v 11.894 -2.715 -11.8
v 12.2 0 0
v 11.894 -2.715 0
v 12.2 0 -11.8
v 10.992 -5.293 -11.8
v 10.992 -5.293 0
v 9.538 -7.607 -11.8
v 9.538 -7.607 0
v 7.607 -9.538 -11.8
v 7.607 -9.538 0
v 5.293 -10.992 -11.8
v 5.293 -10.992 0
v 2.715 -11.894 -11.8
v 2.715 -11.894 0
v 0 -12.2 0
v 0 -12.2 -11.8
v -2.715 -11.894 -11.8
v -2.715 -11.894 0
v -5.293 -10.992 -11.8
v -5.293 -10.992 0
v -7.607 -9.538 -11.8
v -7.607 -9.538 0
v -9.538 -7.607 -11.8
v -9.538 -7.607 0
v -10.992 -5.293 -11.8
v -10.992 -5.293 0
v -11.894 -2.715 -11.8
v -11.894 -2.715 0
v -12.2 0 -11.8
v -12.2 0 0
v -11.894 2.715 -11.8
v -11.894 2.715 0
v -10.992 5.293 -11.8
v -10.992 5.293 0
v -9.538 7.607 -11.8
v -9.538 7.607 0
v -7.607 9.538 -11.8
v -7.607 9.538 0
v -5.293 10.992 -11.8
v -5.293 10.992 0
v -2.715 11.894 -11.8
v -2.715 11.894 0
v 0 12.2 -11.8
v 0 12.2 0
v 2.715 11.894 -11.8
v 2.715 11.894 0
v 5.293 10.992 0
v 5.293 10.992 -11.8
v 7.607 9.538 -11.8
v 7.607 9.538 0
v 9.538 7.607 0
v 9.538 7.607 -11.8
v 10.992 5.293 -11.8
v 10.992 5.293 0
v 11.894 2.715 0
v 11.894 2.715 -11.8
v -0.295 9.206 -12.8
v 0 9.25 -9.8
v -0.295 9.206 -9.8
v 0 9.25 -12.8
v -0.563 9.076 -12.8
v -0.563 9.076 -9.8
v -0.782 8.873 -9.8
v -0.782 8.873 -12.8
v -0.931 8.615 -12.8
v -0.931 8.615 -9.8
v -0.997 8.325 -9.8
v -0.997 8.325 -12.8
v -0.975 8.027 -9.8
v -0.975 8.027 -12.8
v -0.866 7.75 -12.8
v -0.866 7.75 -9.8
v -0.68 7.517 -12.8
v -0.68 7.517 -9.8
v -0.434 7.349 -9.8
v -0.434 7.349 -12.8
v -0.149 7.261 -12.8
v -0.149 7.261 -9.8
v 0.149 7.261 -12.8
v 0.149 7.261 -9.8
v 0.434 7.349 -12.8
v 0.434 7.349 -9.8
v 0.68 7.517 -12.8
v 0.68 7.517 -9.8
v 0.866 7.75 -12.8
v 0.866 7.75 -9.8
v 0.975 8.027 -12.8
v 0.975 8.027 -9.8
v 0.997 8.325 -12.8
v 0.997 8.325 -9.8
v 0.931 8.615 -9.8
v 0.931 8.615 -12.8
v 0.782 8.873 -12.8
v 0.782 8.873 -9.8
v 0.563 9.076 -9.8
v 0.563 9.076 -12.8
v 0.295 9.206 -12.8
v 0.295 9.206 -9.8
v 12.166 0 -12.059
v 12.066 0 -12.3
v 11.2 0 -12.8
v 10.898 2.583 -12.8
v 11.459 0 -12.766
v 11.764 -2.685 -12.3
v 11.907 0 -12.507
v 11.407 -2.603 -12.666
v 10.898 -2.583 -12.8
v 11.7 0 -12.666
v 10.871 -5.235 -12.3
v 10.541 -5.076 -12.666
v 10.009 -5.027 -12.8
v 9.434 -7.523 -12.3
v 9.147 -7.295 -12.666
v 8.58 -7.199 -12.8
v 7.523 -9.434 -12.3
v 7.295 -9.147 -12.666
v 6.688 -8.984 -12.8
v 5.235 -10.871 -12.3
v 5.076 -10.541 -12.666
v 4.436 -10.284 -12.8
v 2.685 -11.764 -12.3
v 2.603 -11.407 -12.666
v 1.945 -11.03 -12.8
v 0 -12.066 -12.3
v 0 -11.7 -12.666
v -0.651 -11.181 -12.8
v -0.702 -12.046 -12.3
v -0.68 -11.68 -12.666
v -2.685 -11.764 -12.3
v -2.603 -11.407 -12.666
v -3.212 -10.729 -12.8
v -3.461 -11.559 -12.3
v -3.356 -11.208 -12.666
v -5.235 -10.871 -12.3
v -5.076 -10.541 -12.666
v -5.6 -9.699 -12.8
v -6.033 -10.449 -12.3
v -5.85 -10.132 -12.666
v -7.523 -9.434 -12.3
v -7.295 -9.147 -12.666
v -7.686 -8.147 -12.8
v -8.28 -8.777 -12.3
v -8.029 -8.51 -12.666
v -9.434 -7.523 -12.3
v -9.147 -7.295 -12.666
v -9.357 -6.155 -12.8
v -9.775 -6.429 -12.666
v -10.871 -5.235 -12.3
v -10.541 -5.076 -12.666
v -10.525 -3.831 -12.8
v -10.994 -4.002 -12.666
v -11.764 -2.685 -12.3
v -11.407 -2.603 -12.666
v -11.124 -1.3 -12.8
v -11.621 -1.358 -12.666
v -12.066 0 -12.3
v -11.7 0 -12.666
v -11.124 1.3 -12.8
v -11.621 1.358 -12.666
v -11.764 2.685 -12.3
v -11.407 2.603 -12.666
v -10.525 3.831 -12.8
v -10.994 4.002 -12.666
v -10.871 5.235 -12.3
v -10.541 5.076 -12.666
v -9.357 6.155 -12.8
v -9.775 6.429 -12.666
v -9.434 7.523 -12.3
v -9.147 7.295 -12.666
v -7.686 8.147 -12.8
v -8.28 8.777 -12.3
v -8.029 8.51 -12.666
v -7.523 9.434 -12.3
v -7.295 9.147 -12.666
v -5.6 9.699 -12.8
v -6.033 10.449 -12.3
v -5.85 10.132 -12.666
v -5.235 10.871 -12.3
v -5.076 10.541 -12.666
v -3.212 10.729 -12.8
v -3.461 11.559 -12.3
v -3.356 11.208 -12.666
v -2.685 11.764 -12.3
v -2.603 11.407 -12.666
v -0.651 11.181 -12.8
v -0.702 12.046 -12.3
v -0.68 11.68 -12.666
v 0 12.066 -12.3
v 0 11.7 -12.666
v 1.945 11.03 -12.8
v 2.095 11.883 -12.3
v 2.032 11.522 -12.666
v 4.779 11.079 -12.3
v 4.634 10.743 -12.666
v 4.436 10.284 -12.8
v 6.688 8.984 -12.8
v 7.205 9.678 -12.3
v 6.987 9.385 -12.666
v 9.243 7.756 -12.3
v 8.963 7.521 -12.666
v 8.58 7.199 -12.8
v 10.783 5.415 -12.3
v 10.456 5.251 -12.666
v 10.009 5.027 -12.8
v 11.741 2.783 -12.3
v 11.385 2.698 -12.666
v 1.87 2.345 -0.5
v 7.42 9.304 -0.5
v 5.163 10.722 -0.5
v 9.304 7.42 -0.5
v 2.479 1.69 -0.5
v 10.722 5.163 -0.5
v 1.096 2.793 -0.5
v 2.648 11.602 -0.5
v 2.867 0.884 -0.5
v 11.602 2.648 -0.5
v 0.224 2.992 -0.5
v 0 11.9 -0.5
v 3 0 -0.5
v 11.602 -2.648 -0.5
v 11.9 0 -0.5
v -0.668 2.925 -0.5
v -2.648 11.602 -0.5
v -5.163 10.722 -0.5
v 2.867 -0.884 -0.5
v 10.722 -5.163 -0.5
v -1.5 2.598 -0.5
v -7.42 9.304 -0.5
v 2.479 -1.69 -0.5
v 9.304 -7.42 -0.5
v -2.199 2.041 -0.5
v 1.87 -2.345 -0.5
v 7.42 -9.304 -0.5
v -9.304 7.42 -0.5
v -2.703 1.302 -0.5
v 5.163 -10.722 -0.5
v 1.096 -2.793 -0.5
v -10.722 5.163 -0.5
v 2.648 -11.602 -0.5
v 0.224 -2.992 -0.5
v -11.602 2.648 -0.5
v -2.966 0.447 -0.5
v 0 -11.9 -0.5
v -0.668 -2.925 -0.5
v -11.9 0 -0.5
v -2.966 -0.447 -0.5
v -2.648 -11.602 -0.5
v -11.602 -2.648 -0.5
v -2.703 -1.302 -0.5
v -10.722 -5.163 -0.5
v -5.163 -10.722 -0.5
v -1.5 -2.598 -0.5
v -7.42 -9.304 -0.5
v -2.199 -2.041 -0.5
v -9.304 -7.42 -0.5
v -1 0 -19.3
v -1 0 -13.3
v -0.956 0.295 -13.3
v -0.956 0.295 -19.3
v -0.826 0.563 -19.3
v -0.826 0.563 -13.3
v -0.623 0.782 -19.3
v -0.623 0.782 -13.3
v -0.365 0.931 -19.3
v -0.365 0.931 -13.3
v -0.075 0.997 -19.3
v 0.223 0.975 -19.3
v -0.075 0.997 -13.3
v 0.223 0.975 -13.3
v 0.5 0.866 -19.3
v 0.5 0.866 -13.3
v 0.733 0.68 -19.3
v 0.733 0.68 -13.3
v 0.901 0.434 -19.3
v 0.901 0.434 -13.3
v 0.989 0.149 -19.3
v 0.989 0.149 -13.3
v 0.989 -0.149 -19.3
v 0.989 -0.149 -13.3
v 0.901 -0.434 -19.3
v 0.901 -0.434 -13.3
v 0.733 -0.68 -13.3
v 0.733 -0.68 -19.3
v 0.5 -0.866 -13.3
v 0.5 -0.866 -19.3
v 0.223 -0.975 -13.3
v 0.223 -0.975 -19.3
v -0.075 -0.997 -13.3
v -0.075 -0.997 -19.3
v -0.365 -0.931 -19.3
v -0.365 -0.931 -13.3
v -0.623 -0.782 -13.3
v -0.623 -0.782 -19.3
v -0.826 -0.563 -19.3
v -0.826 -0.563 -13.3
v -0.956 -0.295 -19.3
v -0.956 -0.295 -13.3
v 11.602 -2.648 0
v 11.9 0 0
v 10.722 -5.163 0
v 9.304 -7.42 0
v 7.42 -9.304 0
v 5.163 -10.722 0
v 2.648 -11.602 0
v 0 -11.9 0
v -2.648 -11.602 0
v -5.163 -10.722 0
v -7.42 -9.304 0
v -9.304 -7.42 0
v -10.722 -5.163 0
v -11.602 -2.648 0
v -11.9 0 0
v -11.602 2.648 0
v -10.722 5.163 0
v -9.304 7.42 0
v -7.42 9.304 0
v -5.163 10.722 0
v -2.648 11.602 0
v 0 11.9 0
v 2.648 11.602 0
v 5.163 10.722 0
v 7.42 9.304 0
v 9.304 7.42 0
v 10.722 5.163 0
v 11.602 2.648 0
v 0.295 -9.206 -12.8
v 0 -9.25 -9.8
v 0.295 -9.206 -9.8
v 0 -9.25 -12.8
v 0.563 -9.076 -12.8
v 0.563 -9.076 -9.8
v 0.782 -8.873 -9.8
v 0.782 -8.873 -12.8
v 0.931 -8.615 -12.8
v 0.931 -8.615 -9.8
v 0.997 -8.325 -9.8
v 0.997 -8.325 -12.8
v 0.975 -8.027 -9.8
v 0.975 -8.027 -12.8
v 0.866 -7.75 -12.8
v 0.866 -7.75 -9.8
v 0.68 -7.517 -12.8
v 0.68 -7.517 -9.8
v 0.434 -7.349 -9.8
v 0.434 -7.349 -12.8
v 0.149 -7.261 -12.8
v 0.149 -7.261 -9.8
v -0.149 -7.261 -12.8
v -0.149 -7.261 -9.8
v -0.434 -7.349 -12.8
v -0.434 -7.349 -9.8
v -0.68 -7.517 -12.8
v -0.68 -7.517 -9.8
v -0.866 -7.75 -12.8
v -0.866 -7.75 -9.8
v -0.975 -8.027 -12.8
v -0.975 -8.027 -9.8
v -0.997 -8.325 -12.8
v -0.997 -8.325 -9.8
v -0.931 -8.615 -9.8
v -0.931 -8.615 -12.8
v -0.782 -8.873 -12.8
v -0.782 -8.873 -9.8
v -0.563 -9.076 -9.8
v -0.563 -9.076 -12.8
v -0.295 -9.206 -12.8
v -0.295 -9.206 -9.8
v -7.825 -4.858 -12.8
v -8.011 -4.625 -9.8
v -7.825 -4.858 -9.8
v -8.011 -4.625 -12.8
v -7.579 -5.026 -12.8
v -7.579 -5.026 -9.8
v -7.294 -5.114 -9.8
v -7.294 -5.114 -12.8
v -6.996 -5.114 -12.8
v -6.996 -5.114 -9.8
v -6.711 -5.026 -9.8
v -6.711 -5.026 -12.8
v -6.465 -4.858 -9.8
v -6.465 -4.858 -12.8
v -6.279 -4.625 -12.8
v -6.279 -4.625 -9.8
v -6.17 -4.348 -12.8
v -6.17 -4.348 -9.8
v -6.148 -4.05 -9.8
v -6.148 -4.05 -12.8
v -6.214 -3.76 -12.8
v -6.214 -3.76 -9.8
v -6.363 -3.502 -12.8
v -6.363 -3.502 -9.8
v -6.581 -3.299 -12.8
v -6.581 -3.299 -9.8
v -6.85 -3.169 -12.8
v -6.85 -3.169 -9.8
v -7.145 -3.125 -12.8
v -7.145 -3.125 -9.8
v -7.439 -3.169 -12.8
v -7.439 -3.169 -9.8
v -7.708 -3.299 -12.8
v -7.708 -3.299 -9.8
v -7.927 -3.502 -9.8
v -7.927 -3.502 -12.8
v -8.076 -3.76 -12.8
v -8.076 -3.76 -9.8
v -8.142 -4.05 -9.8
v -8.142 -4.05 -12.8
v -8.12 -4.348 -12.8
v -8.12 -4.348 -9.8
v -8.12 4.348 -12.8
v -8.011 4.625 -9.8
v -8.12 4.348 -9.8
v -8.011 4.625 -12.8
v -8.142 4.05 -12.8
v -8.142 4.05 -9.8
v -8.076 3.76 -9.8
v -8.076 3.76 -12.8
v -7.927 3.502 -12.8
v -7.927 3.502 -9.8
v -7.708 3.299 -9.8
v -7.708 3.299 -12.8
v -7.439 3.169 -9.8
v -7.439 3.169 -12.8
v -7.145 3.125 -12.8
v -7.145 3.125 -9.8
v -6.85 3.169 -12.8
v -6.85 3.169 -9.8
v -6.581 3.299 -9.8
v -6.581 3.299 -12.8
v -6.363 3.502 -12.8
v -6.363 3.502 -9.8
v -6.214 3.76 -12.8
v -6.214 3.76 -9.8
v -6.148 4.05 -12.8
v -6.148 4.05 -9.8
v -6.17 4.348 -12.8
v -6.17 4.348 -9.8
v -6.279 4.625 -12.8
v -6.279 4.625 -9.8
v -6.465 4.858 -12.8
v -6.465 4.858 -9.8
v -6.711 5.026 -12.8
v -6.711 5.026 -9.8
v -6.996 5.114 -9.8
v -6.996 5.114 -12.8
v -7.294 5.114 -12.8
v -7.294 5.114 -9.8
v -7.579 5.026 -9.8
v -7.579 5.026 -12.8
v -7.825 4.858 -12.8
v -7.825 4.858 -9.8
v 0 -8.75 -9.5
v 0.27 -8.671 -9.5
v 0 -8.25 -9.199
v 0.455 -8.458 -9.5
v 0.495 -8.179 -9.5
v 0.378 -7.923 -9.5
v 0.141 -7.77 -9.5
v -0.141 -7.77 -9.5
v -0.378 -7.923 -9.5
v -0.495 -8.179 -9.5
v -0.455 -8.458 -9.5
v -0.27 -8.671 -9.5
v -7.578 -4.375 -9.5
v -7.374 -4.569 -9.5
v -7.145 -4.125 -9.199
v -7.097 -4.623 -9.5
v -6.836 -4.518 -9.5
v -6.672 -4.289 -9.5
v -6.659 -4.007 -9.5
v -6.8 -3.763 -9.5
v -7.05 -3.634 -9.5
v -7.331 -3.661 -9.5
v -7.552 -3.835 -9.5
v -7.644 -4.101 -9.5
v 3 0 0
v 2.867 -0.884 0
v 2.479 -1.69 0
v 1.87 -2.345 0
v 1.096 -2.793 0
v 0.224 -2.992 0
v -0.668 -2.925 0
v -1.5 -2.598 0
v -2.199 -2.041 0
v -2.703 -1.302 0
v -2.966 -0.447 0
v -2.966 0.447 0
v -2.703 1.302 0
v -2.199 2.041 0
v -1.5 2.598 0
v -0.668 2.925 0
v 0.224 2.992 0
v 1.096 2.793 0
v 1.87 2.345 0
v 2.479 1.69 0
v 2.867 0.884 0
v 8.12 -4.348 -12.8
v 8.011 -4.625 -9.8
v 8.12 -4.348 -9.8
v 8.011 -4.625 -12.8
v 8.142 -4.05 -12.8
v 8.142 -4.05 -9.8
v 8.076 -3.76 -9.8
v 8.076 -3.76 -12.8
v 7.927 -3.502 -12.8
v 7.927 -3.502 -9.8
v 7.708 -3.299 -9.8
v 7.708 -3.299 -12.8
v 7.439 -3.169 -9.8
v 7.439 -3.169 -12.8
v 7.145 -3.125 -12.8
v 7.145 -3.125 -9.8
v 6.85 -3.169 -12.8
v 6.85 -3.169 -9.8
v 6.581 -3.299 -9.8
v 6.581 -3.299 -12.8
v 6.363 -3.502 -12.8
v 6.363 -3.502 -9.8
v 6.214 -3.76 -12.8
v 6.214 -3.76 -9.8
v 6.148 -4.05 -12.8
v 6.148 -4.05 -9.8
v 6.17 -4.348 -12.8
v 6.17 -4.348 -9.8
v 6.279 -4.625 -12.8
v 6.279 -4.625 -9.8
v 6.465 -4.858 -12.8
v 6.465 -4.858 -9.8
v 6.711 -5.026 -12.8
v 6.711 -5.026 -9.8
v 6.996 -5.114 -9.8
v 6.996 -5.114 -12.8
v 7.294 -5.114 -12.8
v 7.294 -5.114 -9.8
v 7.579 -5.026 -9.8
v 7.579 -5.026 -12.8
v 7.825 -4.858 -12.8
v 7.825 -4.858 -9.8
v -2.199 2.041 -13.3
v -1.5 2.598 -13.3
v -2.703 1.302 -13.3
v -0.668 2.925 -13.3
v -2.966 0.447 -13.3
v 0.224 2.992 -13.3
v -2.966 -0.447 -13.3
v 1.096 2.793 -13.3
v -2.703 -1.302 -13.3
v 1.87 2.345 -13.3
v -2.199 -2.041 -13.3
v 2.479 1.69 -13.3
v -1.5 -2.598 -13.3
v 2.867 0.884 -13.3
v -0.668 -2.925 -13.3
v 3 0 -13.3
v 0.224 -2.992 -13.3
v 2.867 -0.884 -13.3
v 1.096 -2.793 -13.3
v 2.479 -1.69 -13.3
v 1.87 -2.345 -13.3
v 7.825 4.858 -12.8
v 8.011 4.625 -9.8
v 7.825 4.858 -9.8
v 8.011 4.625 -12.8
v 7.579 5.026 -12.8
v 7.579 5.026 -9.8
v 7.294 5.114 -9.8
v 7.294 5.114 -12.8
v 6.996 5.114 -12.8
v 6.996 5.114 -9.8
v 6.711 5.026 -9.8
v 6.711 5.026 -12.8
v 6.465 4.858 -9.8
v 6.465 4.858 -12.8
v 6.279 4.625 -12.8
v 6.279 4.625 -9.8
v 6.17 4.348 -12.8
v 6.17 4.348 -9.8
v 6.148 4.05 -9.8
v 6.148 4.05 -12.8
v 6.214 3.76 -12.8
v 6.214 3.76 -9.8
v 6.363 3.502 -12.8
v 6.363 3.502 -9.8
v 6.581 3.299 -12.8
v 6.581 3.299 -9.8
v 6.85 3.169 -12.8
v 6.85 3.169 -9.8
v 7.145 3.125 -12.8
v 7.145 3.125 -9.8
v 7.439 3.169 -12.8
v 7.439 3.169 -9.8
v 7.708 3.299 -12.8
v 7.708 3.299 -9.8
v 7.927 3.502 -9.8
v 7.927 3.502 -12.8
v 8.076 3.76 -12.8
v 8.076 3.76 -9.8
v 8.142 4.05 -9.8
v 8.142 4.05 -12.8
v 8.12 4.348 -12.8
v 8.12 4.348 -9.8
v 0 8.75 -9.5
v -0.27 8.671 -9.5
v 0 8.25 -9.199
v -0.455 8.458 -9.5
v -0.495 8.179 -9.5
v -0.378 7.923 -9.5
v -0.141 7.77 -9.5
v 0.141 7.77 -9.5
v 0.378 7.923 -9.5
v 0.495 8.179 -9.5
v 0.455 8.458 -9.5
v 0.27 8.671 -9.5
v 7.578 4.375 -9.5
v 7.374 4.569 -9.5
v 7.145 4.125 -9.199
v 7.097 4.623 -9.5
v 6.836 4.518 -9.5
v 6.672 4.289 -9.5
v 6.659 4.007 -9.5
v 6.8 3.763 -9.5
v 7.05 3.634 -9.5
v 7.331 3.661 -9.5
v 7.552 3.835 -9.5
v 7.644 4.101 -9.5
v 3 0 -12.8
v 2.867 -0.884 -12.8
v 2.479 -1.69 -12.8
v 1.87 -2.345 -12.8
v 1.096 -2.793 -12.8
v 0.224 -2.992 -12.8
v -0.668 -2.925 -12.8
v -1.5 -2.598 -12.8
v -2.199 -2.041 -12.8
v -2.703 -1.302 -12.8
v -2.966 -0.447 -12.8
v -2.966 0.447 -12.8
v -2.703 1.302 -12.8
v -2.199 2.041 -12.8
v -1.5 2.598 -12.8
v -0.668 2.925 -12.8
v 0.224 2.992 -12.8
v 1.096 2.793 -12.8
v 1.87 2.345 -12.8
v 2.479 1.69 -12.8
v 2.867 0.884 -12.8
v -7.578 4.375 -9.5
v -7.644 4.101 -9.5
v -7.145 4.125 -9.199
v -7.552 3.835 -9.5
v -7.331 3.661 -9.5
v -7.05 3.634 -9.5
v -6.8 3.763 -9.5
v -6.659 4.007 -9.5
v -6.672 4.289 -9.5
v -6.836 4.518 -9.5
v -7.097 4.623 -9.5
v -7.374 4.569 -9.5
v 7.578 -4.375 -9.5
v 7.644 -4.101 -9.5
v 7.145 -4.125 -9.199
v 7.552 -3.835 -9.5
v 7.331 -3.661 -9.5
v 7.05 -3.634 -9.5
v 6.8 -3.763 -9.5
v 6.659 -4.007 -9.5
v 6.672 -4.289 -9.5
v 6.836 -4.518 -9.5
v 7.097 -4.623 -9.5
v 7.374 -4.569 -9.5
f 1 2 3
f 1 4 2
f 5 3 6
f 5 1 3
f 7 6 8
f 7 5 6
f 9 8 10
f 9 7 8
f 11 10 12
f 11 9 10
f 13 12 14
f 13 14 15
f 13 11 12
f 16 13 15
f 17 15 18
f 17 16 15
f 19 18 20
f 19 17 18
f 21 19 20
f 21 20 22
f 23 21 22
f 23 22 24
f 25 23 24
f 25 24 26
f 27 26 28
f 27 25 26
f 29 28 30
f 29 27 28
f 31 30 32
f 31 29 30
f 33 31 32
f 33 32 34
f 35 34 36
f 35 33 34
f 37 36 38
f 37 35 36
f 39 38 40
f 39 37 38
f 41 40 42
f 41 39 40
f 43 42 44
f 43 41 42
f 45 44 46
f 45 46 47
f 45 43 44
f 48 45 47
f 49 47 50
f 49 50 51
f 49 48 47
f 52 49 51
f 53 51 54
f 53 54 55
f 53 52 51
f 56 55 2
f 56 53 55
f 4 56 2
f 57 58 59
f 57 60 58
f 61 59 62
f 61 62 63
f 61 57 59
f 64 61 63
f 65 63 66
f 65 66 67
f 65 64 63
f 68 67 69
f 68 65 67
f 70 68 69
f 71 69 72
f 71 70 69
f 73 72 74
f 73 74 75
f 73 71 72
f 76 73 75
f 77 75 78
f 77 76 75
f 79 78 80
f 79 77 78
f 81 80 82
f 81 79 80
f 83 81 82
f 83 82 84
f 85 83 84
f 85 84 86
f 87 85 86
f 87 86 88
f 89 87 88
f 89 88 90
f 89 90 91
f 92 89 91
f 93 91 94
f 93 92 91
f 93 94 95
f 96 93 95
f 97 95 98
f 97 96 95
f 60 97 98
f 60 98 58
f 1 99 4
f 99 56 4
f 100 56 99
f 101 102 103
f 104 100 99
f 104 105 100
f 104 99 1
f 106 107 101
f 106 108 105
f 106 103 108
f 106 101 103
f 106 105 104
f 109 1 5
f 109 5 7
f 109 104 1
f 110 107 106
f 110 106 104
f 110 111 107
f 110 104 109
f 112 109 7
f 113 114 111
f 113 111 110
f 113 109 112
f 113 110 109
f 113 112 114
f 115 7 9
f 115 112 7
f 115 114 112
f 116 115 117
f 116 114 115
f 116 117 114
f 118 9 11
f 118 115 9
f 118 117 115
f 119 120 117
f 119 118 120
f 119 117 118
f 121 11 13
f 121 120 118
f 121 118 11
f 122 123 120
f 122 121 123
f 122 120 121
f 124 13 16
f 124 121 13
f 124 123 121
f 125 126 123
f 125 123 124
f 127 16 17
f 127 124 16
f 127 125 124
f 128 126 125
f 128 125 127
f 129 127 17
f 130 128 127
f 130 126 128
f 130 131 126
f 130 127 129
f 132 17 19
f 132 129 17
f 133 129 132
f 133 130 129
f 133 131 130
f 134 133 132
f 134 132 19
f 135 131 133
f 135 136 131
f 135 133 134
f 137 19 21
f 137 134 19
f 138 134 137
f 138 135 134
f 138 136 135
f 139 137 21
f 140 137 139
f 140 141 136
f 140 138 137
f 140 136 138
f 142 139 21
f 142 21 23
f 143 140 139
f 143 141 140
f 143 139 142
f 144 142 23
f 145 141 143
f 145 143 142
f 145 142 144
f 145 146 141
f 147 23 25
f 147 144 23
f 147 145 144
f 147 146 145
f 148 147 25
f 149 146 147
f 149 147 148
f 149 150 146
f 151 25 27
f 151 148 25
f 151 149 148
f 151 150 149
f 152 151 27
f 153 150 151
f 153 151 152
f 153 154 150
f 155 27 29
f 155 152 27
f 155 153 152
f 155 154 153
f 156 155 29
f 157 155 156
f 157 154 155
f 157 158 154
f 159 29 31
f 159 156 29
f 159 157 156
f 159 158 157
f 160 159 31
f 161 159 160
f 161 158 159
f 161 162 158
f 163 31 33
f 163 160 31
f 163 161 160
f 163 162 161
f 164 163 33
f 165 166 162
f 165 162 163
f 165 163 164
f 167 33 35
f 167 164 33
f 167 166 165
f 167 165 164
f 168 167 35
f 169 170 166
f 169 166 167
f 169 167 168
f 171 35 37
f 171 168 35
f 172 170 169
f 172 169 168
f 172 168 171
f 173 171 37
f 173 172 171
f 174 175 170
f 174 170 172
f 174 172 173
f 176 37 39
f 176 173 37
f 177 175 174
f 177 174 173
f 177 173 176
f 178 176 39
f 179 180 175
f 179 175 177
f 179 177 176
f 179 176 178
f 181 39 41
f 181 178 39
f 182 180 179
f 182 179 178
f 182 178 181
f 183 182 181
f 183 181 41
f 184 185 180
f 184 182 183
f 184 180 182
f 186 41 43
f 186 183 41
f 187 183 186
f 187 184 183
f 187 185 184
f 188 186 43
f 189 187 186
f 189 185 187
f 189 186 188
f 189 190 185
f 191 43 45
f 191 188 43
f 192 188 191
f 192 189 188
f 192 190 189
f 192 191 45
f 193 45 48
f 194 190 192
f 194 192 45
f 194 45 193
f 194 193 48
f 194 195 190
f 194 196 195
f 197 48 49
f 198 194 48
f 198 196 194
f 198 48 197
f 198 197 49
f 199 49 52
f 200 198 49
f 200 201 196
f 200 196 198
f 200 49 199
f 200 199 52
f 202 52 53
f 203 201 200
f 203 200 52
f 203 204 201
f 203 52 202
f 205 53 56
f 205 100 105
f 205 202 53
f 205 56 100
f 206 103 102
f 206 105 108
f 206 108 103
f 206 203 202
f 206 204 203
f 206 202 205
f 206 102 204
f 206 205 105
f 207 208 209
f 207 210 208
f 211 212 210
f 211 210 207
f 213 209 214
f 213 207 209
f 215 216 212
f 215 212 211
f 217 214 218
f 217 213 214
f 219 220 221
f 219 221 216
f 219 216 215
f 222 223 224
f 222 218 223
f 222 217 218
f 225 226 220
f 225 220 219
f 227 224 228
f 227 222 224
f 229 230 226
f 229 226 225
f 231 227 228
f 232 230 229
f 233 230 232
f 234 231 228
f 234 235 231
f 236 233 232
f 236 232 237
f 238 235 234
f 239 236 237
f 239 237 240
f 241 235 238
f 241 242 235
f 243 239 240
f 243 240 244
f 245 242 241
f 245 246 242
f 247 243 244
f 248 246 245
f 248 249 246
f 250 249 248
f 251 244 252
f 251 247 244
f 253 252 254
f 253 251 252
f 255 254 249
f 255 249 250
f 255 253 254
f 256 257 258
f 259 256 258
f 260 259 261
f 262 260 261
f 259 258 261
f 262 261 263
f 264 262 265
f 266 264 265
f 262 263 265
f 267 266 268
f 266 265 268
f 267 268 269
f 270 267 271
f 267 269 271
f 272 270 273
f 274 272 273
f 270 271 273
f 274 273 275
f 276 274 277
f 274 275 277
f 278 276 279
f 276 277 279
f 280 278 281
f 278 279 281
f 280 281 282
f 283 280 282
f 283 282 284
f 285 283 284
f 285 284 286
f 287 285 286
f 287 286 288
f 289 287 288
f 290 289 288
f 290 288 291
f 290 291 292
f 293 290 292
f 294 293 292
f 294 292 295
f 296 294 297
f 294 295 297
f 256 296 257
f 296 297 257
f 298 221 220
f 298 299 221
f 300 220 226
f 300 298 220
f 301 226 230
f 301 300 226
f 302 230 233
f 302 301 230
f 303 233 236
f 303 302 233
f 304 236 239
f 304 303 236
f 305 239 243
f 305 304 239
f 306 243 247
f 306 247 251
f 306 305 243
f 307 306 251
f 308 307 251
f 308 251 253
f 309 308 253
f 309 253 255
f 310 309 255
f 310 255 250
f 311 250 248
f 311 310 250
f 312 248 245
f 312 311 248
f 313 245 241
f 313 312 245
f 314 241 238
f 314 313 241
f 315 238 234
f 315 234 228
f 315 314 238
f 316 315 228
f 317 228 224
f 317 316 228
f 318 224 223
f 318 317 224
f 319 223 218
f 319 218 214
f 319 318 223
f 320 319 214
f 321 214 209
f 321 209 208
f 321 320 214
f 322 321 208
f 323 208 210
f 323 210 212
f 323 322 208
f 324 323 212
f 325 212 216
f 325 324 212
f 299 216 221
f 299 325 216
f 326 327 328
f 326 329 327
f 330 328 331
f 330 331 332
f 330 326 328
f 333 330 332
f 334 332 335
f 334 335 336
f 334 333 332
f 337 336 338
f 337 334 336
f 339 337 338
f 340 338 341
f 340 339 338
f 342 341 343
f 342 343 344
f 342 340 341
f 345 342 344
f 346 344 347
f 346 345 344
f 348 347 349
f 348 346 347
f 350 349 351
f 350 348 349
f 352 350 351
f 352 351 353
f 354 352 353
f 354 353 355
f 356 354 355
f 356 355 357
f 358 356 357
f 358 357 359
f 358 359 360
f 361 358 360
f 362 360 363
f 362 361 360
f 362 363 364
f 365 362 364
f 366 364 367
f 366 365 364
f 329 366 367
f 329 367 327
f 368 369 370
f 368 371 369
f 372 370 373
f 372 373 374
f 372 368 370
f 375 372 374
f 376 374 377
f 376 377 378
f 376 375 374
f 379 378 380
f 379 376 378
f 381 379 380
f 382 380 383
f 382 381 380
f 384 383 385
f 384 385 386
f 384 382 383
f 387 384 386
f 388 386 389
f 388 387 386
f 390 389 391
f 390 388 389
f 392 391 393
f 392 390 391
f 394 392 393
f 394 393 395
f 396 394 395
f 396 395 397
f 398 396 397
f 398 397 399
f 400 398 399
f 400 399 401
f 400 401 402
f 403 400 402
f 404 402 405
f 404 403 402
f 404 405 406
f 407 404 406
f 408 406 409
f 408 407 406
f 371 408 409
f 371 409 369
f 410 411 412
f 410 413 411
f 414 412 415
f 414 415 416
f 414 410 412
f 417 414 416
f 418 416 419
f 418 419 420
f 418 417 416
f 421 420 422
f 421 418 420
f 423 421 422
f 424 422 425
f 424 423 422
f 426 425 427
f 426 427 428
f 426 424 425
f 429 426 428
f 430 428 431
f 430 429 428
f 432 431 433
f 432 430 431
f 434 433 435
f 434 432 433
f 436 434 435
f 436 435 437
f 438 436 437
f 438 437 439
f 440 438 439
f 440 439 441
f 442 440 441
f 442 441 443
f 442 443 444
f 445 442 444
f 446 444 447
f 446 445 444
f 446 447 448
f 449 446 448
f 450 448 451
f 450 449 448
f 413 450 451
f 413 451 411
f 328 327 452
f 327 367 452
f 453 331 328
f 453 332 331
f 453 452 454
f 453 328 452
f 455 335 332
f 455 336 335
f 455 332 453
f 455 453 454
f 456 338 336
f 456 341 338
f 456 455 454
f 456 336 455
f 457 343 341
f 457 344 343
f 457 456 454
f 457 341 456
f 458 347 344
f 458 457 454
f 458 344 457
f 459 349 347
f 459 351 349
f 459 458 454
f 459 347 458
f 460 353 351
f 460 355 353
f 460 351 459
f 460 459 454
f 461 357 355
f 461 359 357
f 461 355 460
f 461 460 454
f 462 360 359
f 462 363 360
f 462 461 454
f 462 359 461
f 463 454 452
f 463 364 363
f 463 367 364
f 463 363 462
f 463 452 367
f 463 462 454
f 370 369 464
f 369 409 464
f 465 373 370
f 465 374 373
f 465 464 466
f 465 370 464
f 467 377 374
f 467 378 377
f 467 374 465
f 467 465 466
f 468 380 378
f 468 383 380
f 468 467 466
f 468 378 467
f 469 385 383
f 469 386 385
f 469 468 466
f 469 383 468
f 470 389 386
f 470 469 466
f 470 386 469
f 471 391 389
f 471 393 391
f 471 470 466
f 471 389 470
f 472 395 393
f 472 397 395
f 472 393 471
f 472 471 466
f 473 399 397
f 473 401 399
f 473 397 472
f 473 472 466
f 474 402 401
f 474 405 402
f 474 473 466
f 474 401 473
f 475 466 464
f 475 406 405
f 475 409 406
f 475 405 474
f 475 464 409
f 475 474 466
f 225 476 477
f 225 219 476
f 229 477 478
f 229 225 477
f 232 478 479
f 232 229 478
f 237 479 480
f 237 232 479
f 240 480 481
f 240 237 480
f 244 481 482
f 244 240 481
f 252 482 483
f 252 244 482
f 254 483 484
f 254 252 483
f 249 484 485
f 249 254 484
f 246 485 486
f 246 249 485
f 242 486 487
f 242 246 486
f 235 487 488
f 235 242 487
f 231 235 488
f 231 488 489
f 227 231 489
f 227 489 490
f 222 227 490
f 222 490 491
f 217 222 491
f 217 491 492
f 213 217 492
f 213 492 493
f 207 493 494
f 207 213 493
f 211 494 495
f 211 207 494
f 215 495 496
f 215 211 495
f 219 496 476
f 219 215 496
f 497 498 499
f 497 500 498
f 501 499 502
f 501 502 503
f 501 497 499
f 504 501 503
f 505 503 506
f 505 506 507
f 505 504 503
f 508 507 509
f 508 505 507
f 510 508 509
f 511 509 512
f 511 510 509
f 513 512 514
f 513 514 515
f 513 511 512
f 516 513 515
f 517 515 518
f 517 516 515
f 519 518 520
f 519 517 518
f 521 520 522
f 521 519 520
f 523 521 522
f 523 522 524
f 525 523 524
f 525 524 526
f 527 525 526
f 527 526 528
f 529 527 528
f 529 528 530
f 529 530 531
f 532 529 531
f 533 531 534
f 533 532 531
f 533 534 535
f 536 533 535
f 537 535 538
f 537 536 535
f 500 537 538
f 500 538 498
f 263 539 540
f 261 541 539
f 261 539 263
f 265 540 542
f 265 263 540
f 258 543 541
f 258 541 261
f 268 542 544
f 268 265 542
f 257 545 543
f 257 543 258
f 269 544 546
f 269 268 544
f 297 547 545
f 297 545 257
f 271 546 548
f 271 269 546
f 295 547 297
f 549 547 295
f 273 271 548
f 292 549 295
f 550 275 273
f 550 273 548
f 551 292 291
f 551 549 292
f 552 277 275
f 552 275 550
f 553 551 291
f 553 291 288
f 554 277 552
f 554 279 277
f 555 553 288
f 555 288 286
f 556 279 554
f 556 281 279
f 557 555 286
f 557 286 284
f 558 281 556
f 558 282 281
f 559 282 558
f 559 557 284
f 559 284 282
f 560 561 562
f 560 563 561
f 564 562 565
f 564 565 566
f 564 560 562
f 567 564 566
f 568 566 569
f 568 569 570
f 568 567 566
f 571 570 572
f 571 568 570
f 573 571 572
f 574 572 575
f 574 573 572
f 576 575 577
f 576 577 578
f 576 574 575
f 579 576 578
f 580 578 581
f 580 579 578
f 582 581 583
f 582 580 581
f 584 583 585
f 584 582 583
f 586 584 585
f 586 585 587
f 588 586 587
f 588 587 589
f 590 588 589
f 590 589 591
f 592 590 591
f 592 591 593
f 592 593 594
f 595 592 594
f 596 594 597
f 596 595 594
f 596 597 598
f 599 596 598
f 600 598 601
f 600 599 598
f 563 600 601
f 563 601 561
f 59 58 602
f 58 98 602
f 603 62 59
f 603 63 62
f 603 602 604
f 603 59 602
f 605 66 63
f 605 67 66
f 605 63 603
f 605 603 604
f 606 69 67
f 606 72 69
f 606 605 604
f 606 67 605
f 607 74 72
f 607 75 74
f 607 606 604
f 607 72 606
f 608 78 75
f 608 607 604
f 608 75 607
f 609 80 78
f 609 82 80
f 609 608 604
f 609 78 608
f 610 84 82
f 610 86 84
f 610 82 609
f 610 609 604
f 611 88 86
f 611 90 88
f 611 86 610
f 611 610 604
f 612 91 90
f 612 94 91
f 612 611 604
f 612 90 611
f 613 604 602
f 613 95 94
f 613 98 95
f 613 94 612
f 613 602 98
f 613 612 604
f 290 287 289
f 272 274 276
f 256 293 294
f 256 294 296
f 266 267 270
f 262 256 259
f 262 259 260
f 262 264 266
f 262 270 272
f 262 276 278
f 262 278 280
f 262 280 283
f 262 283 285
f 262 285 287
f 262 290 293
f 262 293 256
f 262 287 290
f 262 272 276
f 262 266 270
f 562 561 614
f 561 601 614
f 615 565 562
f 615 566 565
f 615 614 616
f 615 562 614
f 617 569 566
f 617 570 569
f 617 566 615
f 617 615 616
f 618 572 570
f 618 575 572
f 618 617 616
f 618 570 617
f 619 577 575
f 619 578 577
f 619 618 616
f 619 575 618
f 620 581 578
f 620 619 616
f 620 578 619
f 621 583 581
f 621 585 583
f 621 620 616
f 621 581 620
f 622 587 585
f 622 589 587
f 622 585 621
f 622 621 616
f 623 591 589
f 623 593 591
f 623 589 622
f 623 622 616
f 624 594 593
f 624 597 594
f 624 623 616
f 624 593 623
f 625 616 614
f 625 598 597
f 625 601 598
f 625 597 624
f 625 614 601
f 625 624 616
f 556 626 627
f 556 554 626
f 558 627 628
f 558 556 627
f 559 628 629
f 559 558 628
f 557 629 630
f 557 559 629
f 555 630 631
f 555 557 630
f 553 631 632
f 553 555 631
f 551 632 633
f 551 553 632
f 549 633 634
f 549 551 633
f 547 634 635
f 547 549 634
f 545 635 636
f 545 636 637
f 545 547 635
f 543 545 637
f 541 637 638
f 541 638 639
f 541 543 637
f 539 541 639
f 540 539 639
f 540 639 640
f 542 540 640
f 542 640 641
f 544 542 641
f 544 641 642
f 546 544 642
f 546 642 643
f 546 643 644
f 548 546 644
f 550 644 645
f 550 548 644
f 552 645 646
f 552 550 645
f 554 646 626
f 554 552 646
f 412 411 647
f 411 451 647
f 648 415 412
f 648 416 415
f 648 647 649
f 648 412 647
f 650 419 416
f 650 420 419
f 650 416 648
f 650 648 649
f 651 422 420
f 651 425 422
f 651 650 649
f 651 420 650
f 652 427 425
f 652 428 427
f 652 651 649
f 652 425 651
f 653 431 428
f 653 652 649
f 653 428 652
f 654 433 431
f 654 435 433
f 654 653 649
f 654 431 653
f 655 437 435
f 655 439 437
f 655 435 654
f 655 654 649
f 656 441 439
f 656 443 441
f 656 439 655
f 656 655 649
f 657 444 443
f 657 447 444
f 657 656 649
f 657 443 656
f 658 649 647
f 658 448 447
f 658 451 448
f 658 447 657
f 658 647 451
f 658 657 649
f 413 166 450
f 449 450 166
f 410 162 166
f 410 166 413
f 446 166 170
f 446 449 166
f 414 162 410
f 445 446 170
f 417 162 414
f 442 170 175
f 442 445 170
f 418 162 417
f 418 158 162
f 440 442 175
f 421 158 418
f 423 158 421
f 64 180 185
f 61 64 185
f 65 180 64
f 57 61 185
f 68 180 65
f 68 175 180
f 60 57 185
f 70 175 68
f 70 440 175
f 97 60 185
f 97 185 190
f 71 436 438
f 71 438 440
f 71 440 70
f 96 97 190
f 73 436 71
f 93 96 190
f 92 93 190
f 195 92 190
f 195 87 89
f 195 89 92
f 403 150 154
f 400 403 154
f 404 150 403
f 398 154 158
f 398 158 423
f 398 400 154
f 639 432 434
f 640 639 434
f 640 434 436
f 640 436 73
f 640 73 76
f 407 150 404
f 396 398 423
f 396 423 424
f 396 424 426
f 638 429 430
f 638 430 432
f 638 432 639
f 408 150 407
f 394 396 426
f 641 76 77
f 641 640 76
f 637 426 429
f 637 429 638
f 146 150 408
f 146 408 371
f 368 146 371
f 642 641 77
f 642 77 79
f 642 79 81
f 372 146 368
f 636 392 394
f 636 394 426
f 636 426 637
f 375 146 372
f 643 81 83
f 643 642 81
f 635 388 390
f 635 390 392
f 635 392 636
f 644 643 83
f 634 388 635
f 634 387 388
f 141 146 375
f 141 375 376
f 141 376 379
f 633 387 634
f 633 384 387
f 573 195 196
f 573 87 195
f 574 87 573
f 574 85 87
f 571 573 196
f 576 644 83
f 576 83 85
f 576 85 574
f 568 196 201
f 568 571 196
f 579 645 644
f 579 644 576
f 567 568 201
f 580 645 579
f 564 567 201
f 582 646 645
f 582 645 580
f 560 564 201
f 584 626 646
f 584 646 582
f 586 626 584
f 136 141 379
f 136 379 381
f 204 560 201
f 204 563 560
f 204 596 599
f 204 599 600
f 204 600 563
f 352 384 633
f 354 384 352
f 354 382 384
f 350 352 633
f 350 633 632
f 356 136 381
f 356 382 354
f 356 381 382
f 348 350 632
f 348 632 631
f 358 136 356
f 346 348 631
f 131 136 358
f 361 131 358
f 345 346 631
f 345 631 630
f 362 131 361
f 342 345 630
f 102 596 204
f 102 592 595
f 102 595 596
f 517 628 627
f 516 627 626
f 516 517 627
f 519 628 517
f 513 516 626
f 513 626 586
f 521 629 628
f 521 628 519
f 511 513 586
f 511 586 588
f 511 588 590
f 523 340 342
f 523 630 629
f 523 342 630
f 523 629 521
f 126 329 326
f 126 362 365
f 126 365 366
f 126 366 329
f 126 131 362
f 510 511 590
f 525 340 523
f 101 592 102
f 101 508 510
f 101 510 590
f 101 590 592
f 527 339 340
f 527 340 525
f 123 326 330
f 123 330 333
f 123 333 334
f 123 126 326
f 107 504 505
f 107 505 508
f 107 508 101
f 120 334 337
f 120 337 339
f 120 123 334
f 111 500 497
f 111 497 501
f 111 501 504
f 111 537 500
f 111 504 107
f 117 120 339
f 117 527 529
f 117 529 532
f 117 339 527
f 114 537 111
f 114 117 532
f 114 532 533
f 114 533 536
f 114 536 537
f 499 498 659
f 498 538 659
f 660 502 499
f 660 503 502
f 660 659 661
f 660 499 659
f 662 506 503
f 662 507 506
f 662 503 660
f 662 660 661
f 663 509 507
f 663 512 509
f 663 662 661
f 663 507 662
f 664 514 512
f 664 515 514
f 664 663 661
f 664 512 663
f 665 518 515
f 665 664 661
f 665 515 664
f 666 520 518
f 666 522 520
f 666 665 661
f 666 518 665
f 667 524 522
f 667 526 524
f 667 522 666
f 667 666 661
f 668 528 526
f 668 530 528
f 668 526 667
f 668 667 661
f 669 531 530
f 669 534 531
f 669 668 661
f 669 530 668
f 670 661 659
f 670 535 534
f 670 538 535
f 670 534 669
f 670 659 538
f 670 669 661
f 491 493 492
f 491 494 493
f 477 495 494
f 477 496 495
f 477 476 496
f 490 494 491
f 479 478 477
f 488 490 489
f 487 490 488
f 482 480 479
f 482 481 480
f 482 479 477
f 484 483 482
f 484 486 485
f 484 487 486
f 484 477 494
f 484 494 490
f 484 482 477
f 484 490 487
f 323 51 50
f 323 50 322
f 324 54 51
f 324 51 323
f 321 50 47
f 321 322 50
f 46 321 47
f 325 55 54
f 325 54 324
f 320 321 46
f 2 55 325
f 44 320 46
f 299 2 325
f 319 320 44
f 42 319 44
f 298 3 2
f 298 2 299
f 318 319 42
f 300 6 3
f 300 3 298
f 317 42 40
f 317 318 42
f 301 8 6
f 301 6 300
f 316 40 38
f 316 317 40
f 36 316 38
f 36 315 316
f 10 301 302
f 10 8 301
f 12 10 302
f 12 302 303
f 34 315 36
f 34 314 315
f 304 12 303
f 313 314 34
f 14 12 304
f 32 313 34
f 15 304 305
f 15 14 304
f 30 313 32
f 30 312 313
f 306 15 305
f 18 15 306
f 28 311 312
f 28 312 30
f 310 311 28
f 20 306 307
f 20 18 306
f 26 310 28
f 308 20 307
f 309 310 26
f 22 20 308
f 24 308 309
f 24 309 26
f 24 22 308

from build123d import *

# Parameters (mm, degrees)
SKETCH2_R           = 1
BOSS_EXTRUDE1_DEPTH = 6
CIRPATTERN1_COUNT   = 6


with BuildPart() as part:
    # Sketch1 → Revolve1 (revolve)
    with BuildSketch(Plane(origin=(0, 0, 0), x_dir=(1, 0, 0), z_dir=(0, 1, 0))):
        with BuildLine():
            Line((0, 0), (3, 0))
            Line((3, 0), (3, 0.5))
            Line((3, 0.5), (11.9, 0.5))
            Line((11.9, 0.5), (11.9, 0))
            Line((11.9, 0), (12.2, 0))
            Line((12.2, 0), (12.2, 11.8))
            ThreePointArc((12.2, 11.8), (11.907106781, 12.507106781), (11.2, 12.8))
            Line((11.2, 12.8), (3, 12.8))
            Line((3, 12.8), (3, 13.3))
            Line((3, 13.3), (0, 13.3))
            Line((0, 13.3), (0, 0))
        make_face()
    revolve(axis=Axis((0, 0, 0), (0, 0, -1)))

    # Sketch2 → Boss-Extrude1 (add)
    with BuildSketch(Plane(origin=(0, 0, -13.3), x_dir=(-1, 0, 0), z_dir=(0, 0, -1))):
        Circle(SKETCH2_R)
    extrude(amount=BOSS_EXTRUDE1_DEPTH)

    # Sketch4 → M1.6 Clearance Hole1 (revolve, cut)
    with BuildSketch(Plane(origin=(0, 8.25, -12.8), x_dir=(0, 1, 0), z_dir=(1, 0, 0))):
        Polygon((0, 0), (0, 3.600860619), (1, 3), (1, 0), align=None)
    m1_6_clearance_hole1 = revolve(axis=Axis((0, 8.25, -19.15), (0, 0, 1)), mode=Mode.SUBTRACT)

    # CirPattern1: M1.6 Clearance Hole1 ×6 about axis
    cirpattern1_axis = Axis((0, 0, 0), (0, 0, 1))
    for i in range(1, CIRPATTERN1_COUNT):
        add(m1_6_clearance_hole1.rotate(cirpattern1_axis, i * 360 / CIRPATTERN1_COUNT), mode=Mode.SUBTRACT)


solid = part.part
